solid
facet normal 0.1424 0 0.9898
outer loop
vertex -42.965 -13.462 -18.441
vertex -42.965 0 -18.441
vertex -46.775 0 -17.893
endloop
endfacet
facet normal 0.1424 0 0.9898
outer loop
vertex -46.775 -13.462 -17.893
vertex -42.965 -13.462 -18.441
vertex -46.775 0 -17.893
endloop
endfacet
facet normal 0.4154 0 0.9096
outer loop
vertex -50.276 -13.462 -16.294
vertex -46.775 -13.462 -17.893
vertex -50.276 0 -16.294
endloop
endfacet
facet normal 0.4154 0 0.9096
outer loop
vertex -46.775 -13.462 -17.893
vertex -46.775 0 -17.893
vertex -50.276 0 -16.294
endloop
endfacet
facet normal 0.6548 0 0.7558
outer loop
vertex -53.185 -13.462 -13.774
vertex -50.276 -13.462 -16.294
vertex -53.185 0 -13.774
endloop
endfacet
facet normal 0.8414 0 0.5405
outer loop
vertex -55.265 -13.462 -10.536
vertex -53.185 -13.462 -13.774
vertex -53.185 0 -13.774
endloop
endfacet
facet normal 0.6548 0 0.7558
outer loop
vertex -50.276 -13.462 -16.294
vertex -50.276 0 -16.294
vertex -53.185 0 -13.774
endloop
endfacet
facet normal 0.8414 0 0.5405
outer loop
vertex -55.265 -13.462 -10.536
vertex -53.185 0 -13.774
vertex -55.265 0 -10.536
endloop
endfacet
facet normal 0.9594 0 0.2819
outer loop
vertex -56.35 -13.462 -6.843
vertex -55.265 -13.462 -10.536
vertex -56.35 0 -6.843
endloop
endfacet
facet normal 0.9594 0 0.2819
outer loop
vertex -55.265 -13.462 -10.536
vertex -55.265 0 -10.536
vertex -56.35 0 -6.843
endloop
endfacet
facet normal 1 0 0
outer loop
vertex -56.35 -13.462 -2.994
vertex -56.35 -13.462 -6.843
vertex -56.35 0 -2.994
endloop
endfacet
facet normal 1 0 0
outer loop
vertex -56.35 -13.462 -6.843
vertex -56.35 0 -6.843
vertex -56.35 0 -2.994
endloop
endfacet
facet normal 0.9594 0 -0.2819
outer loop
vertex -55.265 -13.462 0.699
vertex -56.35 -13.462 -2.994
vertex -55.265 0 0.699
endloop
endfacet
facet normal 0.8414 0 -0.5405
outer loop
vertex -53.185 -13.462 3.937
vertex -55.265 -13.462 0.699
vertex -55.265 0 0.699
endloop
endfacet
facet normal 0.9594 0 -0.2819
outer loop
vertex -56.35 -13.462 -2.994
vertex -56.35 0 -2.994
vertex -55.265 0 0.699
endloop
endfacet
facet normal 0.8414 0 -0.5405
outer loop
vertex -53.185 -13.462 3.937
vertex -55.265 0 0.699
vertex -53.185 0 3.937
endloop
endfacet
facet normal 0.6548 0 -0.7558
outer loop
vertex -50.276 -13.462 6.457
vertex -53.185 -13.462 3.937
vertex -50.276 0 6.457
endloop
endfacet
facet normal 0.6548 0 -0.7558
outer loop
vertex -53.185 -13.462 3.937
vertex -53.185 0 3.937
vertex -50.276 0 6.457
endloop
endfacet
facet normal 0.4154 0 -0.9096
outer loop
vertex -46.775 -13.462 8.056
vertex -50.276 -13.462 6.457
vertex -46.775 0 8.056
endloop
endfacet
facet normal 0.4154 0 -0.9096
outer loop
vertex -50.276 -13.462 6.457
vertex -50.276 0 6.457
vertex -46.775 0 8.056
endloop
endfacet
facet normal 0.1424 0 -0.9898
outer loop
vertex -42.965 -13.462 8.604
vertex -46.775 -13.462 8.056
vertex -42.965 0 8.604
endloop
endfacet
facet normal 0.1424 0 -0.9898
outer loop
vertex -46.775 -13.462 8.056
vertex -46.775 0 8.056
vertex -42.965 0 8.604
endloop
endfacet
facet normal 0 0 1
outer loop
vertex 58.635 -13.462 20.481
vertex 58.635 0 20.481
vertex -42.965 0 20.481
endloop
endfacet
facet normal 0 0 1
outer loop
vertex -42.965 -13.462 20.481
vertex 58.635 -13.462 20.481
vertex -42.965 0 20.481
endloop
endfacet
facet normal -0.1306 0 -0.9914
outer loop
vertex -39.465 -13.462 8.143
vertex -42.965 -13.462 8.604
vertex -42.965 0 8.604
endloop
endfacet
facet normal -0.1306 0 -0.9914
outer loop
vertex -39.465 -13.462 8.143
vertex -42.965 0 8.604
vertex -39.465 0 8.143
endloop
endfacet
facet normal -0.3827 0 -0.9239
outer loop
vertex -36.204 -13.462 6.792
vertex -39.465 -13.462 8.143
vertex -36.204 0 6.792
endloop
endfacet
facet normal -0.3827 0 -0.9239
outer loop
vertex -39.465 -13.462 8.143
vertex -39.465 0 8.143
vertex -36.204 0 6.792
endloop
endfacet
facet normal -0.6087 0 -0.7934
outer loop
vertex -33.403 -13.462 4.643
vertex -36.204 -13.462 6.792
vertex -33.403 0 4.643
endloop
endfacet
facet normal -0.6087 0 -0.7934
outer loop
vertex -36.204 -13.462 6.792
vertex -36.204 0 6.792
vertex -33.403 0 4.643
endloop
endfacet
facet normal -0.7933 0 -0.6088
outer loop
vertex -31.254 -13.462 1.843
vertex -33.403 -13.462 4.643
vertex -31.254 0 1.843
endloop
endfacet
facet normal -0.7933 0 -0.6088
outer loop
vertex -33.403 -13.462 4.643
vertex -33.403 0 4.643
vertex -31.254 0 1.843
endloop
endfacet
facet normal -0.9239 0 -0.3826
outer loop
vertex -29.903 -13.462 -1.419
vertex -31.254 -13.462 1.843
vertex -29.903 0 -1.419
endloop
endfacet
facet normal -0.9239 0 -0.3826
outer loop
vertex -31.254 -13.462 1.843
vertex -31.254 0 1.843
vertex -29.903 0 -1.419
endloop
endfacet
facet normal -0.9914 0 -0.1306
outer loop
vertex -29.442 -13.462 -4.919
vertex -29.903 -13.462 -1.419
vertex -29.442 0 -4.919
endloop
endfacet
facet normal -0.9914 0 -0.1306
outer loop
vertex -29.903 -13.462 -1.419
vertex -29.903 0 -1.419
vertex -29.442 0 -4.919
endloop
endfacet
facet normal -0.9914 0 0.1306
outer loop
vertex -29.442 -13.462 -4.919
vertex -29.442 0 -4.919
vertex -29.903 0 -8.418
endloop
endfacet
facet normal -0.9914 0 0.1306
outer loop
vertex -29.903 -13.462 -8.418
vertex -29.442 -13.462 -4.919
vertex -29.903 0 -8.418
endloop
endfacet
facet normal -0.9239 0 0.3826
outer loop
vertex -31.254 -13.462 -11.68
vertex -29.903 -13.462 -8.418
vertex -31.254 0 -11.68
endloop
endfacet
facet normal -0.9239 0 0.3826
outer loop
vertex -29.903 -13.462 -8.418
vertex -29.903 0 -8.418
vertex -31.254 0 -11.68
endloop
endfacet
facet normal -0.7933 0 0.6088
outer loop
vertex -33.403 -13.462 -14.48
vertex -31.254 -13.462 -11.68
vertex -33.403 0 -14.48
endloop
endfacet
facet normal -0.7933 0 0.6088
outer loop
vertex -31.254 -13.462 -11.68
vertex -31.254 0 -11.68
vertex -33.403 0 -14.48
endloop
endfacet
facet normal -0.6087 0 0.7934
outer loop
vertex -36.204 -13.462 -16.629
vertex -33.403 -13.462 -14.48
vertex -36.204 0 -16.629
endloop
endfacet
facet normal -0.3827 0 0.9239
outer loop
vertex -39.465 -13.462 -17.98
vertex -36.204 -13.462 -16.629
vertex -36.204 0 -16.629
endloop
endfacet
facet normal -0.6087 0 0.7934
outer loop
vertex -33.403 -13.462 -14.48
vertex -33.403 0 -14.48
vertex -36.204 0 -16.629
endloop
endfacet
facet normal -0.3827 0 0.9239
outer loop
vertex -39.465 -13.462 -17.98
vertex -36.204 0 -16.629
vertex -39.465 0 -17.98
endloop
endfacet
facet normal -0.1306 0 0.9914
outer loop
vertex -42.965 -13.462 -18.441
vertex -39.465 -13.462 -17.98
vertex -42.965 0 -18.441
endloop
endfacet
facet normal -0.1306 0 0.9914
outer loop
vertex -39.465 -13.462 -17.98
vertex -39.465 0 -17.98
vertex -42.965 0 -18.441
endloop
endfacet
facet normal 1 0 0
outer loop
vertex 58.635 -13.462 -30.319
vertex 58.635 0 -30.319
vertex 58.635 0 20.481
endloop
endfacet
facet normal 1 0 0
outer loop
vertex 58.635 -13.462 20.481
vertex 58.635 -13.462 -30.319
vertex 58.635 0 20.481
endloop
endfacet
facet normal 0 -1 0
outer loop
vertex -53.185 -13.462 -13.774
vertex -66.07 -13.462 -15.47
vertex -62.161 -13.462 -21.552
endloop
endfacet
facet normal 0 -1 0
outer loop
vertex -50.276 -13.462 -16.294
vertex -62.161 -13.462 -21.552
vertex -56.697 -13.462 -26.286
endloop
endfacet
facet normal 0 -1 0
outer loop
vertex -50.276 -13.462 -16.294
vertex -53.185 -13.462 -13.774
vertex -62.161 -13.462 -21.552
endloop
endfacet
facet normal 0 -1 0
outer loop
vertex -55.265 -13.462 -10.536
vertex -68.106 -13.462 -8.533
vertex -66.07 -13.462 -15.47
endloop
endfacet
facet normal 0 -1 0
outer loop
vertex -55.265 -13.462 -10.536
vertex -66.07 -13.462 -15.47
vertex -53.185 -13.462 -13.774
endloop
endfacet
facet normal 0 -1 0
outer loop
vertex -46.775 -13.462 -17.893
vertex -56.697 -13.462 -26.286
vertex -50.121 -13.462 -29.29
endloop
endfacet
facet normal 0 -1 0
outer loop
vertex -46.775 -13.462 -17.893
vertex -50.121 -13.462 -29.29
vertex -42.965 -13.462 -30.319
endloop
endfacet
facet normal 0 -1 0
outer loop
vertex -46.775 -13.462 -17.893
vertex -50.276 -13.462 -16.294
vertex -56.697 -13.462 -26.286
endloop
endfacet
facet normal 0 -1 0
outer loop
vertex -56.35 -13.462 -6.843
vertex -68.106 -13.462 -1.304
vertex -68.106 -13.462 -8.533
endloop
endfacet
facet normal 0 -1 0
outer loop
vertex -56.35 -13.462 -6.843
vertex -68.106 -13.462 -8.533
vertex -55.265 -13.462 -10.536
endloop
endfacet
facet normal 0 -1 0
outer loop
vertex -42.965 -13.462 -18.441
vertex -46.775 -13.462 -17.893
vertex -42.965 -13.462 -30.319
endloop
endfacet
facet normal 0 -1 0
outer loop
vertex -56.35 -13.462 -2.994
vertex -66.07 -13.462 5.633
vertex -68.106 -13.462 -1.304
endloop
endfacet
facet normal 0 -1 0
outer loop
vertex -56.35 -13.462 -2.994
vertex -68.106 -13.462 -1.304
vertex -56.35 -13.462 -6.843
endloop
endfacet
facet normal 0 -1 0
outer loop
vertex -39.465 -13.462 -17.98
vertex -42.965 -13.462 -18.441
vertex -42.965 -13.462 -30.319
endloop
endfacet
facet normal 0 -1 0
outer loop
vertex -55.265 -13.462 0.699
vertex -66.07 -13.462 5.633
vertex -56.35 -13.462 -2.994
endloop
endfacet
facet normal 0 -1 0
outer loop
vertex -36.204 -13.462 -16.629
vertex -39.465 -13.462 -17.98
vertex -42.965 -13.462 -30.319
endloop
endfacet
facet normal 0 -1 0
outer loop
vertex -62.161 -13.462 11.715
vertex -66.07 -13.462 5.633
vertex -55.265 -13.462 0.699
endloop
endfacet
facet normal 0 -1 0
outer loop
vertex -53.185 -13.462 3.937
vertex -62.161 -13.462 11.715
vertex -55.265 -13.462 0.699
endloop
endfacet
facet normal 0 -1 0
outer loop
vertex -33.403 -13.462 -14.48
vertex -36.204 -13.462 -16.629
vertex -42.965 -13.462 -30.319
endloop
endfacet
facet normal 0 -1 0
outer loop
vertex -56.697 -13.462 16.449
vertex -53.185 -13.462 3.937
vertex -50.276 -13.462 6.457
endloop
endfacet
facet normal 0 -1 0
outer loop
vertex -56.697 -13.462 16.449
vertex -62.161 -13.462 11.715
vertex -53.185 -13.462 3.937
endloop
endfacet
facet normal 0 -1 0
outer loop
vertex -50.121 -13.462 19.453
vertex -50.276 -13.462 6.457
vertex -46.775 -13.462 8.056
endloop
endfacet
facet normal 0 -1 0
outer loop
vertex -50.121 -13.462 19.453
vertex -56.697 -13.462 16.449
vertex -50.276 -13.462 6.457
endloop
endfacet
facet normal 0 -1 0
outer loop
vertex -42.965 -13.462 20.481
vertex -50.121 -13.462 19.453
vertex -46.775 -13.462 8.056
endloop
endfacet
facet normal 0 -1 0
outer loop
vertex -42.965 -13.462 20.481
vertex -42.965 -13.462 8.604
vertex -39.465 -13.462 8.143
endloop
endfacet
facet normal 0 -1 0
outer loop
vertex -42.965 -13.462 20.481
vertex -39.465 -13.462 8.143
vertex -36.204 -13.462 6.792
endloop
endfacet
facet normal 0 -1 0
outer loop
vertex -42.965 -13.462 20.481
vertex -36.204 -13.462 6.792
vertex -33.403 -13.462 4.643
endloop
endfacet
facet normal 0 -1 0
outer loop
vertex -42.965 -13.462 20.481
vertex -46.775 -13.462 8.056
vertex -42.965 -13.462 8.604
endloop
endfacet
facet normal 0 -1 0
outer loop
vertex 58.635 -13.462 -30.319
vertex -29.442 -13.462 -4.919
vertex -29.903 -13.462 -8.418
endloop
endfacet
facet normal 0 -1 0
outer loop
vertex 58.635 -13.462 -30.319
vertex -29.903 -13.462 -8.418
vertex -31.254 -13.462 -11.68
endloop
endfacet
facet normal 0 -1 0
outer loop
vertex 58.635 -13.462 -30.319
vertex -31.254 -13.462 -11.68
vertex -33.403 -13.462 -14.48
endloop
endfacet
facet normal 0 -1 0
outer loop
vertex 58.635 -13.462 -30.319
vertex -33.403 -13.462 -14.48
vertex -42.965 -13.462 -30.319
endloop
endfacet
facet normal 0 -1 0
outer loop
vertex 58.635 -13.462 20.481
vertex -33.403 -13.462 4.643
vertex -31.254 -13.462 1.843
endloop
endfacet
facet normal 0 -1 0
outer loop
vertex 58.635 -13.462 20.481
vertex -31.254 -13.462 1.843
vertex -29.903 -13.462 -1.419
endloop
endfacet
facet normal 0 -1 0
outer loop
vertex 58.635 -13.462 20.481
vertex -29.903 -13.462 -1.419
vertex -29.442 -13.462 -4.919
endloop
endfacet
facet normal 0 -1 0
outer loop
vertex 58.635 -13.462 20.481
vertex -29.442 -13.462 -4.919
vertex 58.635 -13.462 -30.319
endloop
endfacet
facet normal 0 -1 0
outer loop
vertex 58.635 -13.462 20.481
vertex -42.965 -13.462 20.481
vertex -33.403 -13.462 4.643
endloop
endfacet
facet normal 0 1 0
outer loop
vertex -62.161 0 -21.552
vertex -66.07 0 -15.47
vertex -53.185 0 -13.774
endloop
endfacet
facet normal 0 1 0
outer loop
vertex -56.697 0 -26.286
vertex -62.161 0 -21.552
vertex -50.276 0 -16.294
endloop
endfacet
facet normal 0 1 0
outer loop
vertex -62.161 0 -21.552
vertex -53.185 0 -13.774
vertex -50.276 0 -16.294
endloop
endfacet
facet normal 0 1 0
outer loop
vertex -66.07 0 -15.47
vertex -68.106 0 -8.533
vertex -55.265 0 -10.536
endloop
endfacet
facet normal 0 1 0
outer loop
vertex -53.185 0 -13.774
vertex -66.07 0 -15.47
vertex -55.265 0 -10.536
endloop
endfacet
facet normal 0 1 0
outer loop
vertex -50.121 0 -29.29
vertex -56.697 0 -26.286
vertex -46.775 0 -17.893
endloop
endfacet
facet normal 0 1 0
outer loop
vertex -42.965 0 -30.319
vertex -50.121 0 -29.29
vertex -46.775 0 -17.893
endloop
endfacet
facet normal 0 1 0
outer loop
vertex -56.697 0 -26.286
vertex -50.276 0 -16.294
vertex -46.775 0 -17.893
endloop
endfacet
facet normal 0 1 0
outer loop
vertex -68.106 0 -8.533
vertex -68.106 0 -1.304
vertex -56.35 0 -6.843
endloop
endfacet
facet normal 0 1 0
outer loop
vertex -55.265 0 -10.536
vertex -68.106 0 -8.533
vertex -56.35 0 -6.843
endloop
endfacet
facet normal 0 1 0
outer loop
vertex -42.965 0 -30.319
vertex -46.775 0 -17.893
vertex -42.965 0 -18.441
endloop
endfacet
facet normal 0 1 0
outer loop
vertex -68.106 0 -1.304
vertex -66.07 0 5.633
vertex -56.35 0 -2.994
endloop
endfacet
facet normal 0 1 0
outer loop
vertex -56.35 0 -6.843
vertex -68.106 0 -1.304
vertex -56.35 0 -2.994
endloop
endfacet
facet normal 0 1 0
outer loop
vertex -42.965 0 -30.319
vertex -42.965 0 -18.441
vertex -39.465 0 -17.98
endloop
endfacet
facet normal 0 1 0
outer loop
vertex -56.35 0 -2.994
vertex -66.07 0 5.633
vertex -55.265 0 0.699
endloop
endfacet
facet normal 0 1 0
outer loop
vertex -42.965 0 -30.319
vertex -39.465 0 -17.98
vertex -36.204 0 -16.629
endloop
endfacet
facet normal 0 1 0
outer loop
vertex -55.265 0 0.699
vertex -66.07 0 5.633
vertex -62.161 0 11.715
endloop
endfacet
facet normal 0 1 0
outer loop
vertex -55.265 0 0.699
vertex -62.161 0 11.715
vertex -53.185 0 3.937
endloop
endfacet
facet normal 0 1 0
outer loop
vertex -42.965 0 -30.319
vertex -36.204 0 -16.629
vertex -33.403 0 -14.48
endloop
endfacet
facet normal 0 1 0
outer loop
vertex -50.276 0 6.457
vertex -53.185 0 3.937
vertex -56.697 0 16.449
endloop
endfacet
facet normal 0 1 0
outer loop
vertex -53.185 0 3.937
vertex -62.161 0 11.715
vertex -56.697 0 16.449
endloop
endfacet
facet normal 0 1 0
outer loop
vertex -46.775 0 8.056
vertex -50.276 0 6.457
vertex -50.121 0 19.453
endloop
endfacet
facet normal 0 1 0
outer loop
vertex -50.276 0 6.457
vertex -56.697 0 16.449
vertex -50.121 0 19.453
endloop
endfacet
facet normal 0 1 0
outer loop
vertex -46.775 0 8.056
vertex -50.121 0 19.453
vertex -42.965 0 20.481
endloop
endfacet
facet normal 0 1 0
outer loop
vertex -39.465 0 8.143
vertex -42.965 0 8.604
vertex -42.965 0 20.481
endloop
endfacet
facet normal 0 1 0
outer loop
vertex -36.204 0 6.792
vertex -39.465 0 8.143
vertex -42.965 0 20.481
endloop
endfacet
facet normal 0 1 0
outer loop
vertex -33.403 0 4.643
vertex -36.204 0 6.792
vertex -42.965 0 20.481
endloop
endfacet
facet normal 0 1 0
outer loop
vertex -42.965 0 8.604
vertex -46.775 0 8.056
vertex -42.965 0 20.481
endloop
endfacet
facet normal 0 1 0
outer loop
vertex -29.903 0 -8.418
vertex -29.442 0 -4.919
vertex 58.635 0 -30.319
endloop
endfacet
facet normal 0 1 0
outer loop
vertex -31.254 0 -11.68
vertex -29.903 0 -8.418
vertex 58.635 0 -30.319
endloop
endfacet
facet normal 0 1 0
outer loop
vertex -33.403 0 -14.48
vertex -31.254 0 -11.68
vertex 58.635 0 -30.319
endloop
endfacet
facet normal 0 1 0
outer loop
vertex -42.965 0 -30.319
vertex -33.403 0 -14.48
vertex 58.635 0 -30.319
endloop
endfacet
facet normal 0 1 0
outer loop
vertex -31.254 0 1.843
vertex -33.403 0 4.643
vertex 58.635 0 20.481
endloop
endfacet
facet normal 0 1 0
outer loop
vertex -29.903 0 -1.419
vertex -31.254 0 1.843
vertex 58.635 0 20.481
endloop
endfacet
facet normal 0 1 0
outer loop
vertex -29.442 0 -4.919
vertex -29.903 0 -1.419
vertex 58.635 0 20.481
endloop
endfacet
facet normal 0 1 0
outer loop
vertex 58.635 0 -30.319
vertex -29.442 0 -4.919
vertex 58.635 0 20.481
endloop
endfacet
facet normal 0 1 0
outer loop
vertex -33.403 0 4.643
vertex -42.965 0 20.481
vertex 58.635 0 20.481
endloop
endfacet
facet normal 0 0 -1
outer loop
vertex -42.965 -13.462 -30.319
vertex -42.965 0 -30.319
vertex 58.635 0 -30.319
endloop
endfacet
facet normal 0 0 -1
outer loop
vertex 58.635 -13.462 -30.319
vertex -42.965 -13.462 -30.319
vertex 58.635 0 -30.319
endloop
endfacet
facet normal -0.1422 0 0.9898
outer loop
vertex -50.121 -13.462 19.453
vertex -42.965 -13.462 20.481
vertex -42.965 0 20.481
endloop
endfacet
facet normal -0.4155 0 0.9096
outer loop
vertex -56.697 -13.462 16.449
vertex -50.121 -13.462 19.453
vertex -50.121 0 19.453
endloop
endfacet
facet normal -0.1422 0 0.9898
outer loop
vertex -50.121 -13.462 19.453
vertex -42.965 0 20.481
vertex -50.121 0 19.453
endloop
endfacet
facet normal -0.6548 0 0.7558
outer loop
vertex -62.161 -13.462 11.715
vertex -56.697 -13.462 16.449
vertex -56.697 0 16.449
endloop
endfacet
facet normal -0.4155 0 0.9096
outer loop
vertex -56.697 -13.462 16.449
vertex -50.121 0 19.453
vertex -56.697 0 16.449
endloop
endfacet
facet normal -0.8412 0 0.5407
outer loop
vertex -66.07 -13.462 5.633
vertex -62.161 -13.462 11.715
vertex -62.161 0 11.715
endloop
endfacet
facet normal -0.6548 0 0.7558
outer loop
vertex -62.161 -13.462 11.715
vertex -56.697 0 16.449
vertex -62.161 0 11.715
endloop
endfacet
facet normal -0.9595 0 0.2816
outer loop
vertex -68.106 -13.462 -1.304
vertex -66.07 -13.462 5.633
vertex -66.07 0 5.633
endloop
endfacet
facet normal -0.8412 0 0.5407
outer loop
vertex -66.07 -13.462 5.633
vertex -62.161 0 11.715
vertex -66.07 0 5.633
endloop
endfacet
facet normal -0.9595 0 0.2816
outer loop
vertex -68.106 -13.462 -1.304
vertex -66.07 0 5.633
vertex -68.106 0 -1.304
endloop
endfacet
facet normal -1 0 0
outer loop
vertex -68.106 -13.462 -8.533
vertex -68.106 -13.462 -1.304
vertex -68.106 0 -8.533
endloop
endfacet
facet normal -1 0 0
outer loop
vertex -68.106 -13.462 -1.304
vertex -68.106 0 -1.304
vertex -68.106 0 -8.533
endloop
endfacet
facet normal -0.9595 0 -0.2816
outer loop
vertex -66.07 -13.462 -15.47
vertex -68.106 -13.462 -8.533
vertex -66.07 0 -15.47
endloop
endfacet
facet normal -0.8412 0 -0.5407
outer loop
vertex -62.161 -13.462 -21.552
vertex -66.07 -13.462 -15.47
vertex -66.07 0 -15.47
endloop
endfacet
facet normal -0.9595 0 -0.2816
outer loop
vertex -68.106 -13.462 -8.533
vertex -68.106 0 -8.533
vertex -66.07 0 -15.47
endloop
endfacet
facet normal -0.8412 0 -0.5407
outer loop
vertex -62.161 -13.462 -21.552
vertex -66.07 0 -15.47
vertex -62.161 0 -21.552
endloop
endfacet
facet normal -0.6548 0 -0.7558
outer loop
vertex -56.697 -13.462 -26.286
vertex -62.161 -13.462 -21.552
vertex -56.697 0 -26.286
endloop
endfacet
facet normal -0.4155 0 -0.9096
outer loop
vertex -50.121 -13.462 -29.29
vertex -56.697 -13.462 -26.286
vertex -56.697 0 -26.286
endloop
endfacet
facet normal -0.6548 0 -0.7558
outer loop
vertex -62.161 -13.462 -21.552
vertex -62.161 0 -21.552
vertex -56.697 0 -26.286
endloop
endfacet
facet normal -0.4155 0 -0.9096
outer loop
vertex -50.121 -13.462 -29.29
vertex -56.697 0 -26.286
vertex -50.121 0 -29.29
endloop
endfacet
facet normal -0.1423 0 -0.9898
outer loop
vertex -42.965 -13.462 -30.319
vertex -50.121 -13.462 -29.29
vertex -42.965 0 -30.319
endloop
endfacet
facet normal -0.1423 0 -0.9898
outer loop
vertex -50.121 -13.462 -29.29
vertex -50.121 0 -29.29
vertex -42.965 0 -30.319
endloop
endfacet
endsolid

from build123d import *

# Parameters (mm, degrees)
F2_DEPTH = 13.462


with BuildPart() as f2:
    # F0 (on Front) → F2 (new body)
    with BuildSketch(Plane.XZ):
        with BuildLine():
            Line((-42.96492, -18.441067), (-42.96492, -30.318613))
            Line((-42.96492, -30.318613), (58.63508, -30.318613))
            Line((58.63508, -30.318613), (58.63508, 20.481387))
            Line((58.63508, 20.481387), (-42.96492, 20.481387))
            Line((-42.96492, 20.481387), (-42.96492, 8.603842))
            ThreePointArc((-42.96492, 8.603842), (-33.403101, 4.643207), (-29.442466, -4.918613))
            ThreePointArc((-29.442466, -4.918613), (-33.403101, -14.480432), (-42.96492, -18.441067))
        make_face()
        with BuildLine():
            ThreePointArc((-42.96492, 20.481387), (-68.36492, -4.918613), (-42.96492, -30.318613))
            Line((-42.96492, -30.318613), (-42.96492, -18.441067))
            ThreePointArc((-42.96492, -18.441067), (-56.487375, -4.918613), (-42.96492, 8.603842))
            Line((-42.96492, 8.603842), (-42.96492, 20.481387))
        make_face()
    extrude(amount=F2_DEPTH)


solid = f2.part
